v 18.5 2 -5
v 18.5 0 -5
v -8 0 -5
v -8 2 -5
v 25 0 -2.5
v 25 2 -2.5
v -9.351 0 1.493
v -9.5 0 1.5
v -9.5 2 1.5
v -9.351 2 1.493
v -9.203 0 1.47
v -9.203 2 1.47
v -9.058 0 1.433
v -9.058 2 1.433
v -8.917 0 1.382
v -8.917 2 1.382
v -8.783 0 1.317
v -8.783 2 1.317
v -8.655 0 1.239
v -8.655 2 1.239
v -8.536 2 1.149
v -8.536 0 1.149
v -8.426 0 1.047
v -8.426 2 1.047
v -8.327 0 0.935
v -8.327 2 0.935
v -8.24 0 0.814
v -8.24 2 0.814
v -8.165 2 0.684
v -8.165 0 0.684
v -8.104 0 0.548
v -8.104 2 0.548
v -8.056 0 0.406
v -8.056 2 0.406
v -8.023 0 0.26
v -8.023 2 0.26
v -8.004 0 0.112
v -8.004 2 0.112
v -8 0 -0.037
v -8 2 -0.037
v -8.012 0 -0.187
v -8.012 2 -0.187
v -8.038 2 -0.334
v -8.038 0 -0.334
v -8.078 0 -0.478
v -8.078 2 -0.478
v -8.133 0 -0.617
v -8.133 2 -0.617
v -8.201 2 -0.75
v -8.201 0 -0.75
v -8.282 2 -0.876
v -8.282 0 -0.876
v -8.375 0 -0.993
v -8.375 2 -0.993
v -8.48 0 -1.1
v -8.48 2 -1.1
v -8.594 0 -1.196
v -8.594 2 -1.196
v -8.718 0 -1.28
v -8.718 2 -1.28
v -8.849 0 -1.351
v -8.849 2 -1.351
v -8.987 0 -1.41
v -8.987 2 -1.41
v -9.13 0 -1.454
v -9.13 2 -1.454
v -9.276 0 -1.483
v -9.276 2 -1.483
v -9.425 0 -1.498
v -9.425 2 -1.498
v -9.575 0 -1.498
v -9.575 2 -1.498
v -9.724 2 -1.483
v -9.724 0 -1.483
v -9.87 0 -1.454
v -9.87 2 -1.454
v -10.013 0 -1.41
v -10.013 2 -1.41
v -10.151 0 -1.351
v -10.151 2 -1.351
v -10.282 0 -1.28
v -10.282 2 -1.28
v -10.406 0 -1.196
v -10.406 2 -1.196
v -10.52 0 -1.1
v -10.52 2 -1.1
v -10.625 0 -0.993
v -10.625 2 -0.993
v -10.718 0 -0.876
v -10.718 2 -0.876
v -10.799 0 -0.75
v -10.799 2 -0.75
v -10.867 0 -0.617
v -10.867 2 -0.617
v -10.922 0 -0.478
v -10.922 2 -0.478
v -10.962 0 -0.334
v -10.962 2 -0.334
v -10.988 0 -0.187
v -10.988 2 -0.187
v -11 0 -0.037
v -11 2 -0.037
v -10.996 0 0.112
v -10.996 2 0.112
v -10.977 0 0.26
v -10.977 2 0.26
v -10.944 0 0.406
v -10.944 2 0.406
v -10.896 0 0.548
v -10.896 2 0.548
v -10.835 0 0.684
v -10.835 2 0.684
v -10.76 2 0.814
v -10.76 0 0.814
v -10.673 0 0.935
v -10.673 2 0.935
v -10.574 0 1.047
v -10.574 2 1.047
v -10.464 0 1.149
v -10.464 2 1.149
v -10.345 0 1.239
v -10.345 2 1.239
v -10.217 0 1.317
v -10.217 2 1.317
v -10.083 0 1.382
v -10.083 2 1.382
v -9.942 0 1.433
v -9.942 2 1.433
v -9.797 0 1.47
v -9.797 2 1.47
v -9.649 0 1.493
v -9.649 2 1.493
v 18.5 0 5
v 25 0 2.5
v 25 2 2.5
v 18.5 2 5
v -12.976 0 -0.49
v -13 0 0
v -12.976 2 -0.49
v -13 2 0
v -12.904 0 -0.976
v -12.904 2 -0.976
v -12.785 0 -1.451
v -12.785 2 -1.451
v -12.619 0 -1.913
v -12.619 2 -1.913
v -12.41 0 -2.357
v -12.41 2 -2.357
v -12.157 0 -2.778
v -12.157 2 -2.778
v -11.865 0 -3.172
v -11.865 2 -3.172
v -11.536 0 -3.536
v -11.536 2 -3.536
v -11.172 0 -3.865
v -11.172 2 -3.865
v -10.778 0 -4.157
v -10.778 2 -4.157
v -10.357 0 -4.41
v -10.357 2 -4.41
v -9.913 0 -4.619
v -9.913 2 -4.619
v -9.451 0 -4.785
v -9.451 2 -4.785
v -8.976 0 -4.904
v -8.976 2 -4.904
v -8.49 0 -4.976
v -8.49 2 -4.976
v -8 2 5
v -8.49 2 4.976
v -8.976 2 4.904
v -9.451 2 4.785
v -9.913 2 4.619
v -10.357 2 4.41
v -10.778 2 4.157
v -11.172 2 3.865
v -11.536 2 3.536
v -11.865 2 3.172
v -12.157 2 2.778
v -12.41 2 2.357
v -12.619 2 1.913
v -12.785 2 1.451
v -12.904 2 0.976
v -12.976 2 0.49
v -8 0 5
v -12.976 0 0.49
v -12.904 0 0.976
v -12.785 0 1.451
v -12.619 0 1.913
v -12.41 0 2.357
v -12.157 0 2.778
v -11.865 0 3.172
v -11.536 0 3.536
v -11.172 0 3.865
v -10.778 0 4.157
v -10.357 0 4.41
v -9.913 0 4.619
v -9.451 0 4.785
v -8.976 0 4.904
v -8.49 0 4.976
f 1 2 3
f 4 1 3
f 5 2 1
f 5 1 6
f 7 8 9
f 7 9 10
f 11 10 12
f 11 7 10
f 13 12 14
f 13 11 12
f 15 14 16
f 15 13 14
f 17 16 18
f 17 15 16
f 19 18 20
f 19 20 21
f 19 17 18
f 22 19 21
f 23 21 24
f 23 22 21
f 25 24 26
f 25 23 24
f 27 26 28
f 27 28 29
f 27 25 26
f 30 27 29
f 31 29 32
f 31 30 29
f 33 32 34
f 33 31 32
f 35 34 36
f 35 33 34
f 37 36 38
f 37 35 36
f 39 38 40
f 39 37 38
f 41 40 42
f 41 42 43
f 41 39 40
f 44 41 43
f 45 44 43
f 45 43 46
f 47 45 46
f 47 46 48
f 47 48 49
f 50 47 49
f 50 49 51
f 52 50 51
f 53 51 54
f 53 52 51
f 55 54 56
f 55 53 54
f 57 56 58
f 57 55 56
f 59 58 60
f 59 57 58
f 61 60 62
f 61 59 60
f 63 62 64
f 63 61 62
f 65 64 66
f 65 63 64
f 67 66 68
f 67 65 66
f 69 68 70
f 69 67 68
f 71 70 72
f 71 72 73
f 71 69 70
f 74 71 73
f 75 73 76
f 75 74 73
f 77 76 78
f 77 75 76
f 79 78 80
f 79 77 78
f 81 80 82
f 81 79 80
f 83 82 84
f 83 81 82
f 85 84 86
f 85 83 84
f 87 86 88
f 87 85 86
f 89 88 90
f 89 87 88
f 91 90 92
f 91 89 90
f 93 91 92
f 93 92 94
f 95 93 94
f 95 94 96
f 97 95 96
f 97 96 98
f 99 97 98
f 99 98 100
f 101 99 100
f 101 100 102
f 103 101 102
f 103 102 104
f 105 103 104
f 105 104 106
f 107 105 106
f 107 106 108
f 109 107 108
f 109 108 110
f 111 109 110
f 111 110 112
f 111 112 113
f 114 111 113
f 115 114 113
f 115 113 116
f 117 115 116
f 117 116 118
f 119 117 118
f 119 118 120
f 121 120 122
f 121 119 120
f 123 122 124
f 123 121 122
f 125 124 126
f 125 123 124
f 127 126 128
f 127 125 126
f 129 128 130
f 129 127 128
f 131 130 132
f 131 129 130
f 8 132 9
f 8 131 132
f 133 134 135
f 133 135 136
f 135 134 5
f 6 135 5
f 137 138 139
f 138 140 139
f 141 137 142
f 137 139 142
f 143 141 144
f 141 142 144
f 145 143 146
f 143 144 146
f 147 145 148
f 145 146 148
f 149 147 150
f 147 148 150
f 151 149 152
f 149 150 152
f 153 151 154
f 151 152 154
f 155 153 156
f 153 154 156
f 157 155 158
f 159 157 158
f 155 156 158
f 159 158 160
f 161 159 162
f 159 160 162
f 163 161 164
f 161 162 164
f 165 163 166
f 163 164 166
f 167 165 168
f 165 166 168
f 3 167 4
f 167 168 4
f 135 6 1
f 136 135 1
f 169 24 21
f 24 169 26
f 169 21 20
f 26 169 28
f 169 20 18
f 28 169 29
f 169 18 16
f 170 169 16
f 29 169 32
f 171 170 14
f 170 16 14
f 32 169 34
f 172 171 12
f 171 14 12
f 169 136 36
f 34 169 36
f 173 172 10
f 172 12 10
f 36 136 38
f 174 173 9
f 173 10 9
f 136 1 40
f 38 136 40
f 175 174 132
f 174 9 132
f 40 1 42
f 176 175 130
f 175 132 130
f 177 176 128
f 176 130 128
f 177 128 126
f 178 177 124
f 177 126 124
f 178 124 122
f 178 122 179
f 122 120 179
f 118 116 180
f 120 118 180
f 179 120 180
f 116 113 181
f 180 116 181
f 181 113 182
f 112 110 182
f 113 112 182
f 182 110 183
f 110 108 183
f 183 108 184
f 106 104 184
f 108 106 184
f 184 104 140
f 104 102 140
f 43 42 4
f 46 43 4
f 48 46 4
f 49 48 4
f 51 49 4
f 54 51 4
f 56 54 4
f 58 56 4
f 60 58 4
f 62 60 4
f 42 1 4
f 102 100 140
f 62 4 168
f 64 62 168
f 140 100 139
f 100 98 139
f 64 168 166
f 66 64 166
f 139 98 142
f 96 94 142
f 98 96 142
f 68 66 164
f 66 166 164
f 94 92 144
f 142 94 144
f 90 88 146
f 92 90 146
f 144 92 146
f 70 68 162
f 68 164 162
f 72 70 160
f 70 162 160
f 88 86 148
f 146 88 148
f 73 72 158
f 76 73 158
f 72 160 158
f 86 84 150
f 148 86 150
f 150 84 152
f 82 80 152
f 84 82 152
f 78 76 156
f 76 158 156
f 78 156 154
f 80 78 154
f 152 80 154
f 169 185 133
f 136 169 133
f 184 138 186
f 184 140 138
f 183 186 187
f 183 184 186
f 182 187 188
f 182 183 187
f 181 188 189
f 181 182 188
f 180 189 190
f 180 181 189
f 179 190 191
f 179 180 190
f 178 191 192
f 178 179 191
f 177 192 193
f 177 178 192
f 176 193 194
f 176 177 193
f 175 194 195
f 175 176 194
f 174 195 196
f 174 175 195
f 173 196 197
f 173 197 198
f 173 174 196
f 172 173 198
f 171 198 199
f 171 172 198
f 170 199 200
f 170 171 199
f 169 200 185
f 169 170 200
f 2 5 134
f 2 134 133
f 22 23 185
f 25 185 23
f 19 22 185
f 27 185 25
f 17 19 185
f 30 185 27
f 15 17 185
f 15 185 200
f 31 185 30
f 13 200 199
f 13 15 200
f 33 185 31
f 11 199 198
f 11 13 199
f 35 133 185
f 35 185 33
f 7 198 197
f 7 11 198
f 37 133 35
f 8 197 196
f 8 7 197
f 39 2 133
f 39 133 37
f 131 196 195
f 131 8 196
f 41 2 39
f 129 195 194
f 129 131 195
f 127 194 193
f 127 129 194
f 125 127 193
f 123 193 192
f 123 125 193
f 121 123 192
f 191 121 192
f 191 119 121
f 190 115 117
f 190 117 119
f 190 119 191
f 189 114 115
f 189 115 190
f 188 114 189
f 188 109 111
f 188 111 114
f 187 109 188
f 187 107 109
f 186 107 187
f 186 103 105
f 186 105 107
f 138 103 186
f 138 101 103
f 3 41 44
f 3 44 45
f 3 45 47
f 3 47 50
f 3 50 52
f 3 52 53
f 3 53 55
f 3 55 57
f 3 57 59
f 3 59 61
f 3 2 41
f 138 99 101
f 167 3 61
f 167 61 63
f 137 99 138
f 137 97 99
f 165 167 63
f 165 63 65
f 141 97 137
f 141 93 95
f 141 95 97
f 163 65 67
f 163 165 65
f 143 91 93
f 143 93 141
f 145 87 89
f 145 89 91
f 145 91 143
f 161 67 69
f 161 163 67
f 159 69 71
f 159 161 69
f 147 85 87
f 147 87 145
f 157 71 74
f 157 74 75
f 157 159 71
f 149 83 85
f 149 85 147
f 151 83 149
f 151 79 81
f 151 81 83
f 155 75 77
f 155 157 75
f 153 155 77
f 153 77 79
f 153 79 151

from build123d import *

# Parameters (mm, degrees)
CROQUIS1_R              = 1.5
SALIENTE_EXTRUIR1_DEPTH = 2
REDONDEO1_R             = 5


with BuildPart() as part:
    # Croquis1 → Saliente-Extruir1 (new body)
    with BuildSketch(Plane(origin=(0, 0, 0), x_dir=(1, 0, 0), z_dir=(0, 1, 0))):
        Polygon((-13, 0), (-13, 5), (0, 5), (18.5, 5), (25, 2.5), (25, 0), (25, -2.5), (18.5, -5), (0, -5), (-13, -5), align=None)
        with Locations(Location((-9.5, 0, 0), (0, 0, 270))):
            Circle(CROQUIS1_R, mode=Mode.SUBTRACT)
    extrude(amount=SALIENTE_EXTRUIR1_DEPTH)

    # Redondeo1
    redondeo1_edges = [part.edges().sort_by_distance(p)[0] for p in [
        (-13, 1, 5),
        (-13, 1, -5),
    ]]
    fillet(redondeo1_edges, radius=REDONDEO1_R - 0.0001)  # a hair under: the kernel refuses the full size


solid = part.part
